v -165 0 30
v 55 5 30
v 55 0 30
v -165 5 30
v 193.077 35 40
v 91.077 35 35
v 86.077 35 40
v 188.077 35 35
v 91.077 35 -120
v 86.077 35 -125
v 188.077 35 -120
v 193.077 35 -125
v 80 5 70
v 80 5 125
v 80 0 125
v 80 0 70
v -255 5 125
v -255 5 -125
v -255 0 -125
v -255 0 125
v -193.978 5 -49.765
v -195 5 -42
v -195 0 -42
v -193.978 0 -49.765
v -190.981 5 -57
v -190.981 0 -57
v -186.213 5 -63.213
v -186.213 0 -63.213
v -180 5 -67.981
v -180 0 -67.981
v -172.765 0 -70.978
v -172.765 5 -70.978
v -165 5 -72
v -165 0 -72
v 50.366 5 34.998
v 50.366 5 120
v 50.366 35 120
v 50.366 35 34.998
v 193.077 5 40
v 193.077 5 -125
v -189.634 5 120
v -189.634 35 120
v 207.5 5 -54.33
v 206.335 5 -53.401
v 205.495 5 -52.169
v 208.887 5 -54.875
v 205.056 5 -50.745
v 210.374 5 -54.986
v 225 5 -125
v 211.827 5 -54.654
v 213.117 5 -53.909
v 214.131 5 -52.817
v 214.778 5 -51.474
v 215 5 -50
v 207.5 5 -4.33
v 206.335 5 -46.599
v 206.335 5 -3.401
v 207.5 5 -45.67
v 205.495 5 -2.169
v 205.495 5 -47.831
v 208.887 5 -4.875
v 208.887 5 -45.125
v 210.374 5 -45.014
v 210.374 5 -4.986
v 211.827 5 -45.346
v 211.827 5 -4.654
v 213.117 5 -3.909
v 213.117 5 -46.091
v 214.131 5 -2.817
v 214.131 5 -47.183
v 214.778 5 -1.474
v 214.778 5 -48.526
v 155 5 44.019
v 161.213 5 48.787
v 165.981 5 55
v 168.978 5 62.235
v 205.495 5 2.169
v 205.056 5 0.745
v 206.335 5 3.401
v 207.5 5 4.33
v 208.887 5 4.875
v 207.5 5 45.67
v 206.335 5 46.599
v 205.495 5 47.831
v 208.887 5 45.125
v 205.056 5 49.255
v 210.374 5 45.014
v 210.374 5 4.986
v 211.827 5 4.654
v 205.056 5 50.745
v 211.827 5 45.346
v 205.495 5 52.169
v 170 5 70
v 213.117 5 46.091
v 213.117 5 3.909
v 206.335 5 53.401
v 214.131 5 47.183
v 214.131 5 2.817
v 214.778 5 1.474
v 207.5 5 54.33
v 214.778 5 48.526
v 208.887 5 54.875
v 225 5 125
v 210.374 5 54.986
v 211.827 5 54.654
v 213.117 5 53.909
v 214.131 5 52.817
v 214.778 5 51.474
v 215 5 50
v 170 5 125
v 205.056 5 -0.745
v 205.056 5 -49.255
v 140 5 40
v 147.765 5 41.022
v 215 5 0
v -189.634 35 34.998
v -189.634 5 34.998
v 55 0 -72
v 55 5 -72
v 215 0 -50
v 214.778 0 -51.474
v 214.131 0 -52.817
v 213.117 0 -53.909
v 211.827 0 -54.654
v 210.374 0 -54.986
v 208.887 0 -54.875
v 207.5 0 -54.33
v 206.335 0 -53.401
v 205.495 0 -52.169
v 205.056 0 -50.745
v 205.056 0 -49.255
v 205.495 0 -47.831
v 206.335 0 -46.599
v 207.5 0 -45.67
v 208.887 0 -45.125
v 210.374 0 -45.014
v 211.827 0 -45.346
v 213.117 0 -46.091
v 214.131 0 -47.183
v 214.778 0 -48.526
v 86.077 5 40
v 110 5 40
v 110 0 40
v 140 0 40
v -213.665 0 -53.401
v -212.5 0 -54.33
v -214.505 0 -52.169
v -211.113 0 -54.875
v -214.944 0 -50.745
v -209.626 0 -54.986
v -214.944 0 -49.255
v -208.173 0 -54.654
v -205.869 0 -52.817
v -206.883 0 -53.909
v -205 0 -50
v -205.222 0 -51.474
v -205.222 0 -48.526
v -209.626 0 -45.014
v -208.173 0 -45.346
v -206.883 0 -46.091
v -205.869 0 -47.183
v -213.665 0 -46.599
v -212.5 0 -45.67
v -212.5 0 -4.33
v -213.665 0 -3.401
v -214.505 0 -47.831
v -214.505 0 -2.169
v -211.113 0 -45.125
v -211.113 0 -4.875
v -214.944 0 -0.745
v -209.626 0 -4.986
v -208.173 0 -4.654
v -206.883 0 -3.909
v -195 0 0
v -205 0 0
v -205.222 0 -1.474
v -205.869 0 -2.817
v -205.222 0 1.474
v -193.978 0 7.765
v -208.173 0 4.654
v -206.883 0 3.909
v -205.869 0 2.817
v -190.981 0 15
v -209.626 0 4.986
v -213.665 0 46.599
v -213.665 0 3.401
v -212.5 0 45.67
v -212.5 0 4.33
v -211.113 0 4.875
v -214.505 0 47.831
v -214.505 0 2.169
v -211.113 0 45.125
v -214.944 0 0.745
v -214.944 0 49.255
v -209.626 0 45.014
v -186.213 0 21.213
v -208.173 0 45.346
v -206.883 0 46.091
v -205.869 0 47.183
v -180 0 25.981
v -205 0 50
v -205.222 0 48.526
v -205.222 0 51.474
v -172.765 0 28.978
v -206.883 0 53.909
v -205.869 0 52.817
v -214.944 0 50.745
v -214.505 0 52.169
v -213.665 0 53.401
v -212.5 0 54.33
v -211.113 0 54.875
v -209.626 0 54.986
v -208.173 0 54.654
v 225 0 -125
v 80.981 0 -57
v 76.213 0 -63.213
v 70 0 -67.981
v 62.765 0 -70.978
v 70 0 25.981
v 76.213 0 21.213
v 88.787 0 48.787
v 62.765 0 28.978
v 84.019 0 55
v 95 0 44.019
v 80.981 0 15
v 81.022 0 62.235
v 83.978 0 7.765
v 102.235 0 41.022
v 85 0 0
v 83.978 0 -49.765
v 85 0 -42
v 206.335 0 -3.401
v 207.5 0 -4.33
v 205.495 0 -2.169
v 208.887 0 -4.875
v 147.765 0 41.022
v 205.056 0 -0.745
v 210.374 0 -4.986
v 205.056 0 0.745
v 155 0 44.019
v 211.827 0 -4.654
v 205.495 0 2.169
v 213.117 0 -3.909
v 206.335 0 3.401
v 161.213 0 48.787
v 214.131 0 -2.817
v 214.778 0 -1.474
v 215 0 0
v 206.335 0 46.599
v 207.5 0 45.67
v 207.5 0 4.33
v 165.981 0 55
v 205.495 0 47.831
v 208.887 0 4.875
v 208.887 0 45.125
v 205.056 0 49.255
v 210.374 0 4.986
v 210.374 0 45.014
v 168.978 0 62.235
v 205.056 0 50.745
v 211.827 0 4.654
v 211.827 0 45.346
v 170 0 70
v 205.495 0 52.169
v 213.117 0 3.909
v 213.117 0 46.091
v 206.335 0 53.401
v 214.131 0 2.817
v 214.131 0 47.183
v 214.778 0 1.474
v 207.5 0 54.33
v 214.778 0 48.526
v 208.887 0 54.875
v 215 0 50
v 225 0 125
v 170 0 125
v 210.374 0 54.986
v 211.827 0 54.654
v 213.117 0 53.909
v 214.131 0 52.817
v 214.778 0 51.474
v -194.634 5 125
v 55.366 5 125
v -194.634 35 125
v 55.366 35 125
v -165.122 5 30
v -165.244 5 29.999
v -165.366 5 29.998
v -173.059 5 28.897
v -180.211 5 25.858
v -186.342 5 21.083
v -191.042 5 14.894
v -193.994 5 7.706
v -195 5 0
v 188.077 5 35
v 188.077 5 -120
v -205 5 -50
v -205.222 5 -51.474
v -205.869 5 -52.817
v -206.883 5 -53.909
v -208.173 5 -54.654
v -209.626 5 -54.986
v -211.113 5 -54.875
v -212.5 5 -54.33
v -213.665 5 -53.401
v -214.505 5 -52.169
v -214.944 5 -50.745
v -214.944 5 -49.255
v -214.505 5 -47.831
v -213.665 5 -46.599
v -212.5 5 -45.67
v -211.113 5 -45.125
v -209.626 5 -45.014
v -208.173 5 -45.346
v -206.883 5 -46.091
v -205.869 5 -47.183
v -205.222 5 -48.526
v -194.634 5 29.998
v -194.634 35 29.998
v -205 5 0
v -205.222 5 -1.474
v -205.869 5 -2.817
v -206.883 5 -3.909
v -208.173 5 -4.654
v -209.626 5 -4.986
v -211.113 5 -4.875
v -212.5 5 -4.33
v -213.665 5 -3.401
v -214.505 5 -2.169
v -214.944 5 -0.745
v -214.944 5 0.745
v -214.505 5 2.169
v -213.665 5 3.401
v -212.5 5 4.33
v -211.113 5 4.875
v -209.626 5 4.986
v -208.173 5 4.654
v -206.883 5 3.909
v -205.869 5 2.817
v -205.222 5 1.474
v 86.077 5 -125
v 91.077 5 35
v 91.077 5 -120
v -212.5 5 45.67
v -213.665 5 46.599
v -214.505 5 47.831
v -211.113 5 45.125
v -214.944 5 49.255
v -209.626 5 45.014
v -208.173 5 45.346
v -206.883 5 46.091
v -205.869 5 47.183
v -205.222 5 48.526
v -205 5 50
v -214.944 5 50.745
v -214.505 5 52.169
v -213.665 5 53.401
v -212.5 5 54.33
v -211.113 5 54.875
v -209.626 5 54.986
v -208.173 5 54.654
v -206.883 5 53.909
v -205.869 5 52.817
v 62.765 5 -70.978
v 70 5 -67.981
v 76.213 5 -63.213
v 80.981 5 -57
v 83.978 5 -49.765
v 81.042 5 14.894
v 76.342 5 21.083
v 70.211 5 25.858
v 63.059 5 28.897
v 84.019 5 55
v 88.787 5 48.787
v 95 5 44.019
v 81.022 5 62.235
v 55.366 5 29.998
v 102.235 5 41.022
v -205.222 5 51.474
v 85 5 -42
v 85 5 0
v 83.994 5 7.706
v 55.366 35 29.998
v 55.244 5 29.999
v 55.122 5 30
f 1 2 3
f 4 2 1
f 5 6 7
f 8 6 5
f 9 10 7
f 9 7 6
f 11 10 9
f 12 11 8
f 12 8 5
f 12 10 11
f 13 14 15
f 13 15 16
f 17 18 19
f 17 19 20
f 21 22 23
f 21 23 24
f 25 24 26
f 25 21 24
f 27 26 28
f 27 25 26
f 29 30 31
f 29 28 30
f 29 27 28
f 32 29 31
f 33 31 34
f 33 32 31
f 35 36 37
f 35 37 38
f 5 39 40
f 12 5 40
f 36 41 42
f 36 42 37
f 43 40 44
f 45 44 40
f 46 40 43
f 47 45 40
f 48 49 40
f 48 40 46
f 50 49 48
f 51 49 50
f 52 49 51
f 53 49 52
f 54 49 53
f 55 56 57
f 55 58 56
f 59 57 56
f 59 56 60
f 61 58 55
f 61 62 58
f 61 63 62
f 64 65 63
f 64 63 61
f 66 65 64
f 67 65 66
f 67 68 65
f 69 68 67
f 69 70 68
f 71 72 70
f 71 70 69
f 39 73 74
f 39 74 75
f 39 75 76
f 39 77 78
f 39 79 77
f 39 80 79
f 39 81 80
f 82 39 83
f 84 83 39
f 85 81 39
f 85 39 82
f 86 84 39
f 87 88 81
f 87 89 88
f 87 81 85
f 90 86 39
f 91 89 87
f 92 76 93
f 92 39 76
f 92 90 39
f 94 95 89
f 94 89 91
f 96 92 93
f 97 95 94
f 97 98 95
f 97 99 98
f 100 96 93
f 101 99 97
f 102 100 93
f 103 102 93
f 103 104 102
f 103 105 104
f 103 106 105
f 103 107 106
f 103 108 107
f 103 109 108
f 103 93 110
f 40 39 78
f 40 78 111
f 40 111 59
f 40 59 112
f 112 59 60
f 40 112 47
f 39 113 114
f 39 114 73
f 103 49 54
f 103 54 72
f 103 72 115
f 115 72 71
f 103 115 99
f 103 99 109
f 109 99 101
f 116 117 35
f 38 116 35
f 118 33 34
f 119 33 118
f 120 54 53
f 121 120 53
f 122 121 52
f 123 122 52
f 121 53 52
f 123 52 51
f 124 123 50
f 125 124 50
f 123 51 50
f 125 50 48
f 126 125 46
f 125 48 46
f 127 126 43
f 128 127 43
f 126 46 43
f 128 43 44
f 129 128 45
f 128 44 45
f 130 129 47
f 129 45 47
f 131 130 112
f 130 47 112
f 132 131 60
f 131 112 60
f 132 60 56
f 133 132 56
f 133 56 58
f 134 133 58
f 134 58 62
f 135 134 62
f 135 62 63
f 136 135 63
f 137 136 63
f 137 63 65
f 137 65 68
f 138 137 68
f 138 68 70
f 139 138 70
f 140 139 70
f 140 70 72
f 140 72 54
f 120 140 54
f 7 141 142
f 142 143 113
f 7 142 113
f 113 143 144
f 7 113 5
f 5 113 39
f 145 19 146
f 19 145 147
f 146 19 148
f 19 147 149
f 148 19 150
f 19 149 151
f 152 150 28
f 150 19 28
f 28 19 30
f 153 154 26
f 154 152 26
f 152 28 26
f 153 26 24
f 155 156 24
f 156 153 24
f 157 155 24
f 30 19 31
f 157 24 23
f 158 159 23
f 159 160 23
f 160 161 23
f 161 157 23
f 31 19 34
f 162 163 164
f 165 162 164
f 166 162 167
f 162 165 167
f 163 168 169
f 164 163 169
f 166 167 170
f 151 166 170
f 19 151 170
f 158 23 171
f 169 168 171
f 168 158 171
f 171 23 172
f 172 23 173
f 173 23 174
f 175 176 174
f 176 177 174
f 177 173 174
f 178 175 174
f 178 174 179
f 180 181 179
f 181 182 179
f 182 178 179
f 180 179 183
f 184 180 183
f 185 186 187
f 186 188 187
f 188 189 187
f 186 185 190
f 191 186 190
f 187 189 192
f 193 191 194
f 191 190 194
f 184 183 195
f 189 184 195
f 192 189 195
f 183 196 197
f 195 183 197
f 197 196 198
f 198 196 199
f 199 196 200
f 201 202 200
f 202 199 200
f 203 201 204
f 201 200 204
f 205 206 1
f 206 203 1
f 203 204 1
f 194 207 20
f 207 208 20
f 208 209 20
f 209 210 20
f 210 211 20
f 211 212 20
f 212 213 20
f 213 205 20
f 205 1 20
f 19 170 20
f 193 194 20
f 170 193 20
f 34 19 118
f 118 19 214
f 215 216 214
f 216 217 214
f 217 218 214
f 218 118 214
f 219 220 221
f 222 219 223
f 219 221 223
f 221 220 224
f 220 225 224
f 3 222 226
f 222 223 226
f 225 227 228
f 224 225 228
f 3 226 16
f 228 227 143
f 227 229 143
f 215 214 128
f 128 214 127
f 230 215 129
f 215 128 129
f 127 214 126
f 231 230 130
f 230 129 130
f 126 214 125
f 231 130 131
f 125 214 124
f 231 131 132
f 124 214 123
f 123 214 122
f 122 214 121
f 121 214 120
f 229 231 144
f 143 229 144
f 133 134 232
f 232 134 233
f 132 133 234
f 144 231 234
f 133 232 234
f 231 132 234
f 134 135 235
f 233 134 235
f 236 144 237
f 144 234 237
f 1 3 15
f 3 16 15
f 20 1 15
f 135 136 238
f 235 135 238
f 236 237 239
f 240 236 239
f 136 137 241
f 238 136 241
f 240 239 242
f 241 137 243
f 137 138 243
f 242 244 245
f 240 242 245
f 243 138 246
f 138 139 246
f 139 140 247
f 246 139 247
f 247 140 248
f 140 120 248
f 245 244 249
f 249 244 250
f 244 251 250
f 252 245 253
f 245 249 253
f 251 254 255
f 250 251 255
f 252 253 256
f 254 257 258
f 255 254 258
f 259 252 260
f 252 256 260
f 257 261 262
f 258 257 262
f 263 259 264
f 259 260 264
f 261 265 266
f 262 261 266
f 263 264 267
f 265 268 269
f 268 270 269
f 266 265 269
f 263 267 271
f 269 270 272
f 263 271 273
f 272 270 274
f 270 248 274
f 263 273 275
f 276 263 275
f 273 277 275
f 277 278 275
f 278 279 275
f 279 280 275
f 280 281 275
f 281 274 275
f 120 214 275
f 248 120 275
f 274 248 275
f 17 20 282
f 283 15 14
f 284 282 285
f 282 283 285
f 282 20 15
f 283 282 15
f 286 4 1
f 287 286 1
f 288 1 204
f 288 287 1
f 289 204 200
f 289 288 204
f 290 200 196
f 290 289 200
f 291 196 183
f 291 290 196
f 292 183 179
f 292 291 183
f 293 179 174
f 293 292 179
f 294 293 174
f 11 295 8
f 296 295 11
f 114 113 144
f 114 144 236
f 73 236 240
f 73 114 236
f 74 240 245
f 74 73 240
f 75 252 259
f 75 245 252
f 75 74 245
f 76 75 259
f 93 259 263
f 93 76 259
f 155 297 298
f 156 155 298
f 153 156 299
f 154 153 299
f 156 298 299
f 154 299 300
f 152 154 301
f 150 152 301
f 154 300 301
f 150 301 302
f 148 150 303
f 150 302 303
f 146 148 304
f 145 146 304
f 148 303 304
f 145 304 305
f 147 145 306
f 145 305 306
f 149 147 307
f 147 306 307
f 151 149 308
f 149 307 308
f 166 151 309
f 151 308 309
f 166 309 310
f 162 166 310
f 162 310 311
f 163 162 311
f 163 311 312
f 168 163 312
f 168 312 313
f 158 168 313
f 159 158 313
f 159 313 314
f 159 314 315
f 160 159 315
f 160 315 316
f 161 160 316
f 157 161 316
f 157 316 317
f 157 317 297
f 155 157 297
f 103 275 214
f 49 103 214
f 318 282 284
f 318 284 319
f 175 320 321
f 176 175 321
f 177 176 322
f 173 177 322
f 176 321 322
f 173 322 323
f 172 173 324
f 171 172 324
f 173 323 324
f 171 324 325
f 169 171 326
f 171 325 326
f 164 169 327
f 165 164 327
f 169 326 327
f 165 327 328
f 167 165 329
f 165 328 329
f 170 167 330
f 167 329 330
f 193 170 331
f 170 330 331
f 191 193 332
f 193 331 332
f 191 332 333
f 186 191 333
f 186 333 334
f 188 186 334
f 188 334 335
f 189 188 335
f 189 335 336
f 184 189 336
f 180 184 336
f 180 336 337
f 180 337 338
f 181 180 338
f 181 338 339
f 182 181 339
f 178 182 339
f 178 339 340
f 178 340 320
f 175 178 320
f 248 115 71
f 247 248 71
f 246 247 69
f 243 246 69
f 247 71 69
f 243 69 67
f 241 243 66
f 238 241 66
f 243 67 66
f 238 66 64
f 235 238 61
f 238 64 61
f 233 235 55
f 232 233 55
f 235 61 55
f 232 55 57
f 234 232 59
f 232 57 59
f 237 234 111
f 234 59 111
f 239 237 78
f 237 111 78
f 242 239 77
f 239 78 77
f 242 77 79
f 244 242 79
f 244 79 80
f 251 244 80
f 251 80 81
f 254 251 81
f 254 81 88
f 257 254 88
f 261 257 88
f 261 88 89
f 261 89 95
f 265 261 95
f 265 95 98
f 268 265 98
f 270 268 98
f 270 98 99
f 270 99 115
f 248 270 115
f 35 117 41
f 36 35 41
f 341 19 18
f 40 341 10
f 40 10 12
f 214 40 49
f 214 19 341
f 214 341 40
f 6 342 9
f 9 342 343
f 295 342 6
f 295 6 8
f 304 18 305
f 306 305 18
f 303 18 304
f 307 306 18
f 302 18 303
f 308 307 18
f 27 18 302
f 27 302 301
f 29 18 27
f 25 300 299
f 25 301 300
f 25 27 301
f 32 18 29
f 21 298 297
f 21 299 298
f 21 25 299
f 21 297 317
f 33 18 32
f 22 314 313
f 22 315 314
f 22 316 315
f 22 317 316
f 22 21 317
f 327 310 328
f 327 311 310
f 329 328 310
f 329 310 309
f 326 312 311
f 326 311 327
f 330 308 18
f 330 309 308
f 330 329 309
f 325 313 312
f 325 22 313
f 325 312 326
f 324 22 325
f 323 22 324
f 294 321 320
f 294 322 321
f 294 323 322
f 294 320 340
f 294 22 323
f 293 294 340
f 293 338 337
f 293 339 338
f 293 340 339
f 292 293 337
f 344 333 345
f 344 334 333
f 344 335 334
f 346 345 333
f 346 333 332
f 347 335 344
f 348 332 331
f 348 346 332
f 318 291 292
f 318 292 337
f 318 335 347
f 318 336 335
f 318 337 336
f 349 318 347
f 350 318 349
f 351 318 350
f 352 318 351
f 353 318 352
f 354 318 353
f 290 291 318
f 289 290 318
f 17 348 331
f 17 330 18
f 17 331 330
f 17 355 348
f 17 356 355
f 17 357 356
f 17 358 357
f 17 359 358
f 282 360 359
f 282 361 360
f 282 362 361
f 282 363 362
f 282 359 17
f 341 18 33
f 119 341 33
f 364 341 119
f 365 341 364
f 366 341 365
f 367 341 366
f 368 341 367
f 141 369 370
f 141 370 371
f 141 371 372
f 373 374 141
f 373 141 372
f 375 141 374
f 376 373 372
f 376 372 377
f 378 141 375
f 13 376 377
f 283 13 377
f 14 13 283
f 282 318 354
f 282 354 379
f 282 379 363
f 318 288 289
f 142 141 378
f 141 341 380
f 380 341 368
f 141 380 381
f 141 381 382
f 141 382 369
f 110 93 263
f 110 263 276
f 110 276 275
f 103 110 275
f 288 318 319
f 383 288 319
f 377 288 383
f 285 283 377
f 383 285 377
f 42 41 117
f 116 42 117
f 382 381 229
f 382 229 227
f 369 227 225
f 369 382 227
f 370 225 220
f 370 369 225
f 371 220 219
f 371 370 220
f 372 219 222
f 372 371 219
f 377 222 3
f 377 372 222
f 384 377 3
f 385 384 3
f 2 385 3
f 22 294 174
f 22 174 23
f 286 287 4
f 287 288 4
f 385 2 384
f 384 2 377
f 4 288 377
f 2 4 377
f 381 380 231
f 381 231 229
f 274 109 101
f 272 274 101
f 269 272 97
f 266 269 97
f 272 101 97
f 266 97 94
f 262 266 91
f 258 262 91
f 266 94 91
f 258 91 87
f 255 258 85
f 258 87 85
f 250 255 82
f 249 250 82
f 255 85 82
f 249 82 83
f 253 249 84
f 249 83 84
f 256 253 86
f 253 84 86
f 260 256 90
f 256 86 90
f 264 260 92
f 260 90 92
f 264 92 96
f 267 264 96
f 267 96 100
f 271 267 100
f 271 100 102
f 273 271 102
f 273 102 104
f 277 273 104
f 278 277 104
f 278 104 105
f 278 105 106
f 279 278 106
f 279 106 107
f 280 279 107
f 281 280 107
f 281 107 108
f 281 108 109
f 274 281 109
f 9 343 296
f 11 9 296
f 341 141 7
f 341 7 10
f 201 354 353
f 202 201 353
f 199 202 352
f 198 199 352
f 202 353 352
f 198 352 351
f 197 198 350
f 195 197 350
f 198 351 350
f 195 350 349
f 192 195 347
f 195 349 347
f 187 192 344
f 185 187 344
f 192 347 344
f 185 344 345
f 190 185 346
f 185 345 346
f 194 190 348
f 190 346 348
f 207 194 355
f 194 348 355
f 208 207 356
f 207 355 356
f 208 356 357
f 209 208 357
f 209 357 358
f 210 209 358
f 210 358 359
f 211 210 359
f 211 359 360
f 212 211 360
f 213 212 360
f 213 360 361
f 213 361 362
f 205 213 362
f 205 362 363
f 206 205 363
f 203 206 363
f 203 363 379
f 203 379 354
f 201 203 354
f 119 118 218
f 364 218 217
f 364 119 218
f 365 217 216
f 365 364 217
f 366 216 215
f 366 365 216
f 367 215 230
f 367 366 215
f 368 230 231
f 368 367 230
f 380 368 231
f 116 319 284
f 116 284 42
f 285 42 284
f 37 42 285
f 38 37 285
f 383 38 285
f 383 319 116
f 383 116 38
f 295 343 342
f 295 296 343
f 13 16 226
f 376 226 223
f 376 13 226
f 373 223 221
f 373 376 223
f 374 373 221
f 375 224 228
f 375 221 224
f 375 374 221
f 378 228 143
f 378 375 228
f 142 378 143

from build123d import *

# Parameters (mm, degrees)
SKETCH1_W           = 450
SKETCH1_H           = 250
BOSS_EXTRUDE1_DEPTH = 5
CUT_EXTRUDE1_DEPTH  = 10
SKETCH3_W           = 250
SKETCH3_H           = 5
BOSS_EXTRUDE2_DEPTH = 30
SKETCH4_R           = 5
CUT_EXTRUDE2_DEPTH  = 30
SKETCH5_W           = 107
SKETCH5_H           = 165
SKETCH5_W_2         = 97
SKETCH5_H_2         = 155
SKETCH5_W_3         = 250
SKETCH5_H_3         = 95.00223246
SKETCH5_W_4         = 240
SKETCH5_H_4         = 85.00223246
BOSS_EXTRUDE3_DEPTH = 30


with BuildPart() as part:
    # Sketch1 → Boss-Extrude1 (new body)
    with BuildSketch(Plane(origin=(0, 0, 0), x_dir=(1, 0, 0), z_dir=(0, 1, 0))):
        Rectangle(SKETCH1_W, SKETCH1_H)
    extrude(amount=BOSS_EXTRUDE1_DEPTH)

    # Sketch2 → Cut-Extrude1 (cut)
    with BuildSketch(Plane(origin=(0, 5, 0), x_dir=(1, 0, 0), z_dir=(0, 1, 0))):
        with BuildLine():
            Line((-165, 72), (55, 72))
            ThreePointArc((55, 72), (76.213203436, 63.213203436), (85, 42))
            Line((85, 42), (85, 0))
            ThreePointArc((85, 0), (76.213203436, -21.213203436), (55, -30))
            Line((55, -30), (-165, -30))
            ThreePointArc((-165, -30), (-186.213203436, -21.213203436), (-195, 0))
            Line((-195, 0), (-195, 42))
            ThreePointArc((-195, 42), (-186.213203436, 63.213203436), (-165, 72))
        make_face()
        with BuildLine():
            Line((110, -40), (140, -40))
            ThreePointArc((140, -40), (161.213203436, -48.786796564), (170, -70))
            Line((170, -70), (170, -125))
            Line((170, -125), (80, -125))
            Line((80, -125), (80, -70))
            ThreePointArc((80, -70), (88.786796564, -48.786796564), (110, -40))
        make_face()
    extrude(amount=-CUT_EXTRUDE1_DEPTH, mode=Mode.SUBTRACT)

    # Sketch3 → Boss-Extrude2 (add)
    with BuildSketch(Plane.ZY.offset(225)):
        with Locations((0, 2.5)):
            Rectangle(SKETCH3_W, SKETCH3_H)
    extrude(amount=BOSS_EXTRUDE2_DEPTH)

    # Sketch4 → Cut-Extrude2 (cut)
    with BuildSketch(Plane(origin=(0, 5, 0), x_dir=(1, 0, 0), z_dir=(0, 1, 0))):
        with Locations((210, 0)):
            Circle(SKETCH4_R)
        with Locations((210, 50)):
            Circle(SKETCH4_R)
        with Locations((210, -50)):
            Circle(SKETCH4_R)
        with Locations((-210, -50)):
            Circle(SKETCH4_R)
        with Locations((-210, 0)):
            Circle(SKETCH4_R)
        with Locations((-210, 50)):
            Circle(SKETCH4_R)
    extrude(amount=-CUT_EXTRUDE2_DEPTH, mode=Mode.SUBTRACT)

    # Sketch5 → Boss-Extrude3 (add)
    with BuildSketch(Plane(origin=(0, 5, 0), x_dir=(1, 0, 0), z_dir=(0, 1, 0))):
        with Locations((139.576867422, 42.5)):
            Rectangle(SKETCH5_W, SKETCH5_H)
        with Locations((139.576867422, 42.5)):
            Rectangle(SKETCH5_W_2, SKETCH5_H_2, mode=Mode.SUBTRACT)
        with Locations((-69.634018269, -77.49888377)):
            Rectangle(SKETCH5_W_3, SKETCH5_H_3)
        with Locations((-69.634018269, -77.49888377)):
            Rectangle(SKETCH5_W_4, SKETCH5_H_4, mode=Mode.SUBTRACT)
    extrude(amount=BOSS_EXTRUDE3_DEPTH)


solid = part.part
